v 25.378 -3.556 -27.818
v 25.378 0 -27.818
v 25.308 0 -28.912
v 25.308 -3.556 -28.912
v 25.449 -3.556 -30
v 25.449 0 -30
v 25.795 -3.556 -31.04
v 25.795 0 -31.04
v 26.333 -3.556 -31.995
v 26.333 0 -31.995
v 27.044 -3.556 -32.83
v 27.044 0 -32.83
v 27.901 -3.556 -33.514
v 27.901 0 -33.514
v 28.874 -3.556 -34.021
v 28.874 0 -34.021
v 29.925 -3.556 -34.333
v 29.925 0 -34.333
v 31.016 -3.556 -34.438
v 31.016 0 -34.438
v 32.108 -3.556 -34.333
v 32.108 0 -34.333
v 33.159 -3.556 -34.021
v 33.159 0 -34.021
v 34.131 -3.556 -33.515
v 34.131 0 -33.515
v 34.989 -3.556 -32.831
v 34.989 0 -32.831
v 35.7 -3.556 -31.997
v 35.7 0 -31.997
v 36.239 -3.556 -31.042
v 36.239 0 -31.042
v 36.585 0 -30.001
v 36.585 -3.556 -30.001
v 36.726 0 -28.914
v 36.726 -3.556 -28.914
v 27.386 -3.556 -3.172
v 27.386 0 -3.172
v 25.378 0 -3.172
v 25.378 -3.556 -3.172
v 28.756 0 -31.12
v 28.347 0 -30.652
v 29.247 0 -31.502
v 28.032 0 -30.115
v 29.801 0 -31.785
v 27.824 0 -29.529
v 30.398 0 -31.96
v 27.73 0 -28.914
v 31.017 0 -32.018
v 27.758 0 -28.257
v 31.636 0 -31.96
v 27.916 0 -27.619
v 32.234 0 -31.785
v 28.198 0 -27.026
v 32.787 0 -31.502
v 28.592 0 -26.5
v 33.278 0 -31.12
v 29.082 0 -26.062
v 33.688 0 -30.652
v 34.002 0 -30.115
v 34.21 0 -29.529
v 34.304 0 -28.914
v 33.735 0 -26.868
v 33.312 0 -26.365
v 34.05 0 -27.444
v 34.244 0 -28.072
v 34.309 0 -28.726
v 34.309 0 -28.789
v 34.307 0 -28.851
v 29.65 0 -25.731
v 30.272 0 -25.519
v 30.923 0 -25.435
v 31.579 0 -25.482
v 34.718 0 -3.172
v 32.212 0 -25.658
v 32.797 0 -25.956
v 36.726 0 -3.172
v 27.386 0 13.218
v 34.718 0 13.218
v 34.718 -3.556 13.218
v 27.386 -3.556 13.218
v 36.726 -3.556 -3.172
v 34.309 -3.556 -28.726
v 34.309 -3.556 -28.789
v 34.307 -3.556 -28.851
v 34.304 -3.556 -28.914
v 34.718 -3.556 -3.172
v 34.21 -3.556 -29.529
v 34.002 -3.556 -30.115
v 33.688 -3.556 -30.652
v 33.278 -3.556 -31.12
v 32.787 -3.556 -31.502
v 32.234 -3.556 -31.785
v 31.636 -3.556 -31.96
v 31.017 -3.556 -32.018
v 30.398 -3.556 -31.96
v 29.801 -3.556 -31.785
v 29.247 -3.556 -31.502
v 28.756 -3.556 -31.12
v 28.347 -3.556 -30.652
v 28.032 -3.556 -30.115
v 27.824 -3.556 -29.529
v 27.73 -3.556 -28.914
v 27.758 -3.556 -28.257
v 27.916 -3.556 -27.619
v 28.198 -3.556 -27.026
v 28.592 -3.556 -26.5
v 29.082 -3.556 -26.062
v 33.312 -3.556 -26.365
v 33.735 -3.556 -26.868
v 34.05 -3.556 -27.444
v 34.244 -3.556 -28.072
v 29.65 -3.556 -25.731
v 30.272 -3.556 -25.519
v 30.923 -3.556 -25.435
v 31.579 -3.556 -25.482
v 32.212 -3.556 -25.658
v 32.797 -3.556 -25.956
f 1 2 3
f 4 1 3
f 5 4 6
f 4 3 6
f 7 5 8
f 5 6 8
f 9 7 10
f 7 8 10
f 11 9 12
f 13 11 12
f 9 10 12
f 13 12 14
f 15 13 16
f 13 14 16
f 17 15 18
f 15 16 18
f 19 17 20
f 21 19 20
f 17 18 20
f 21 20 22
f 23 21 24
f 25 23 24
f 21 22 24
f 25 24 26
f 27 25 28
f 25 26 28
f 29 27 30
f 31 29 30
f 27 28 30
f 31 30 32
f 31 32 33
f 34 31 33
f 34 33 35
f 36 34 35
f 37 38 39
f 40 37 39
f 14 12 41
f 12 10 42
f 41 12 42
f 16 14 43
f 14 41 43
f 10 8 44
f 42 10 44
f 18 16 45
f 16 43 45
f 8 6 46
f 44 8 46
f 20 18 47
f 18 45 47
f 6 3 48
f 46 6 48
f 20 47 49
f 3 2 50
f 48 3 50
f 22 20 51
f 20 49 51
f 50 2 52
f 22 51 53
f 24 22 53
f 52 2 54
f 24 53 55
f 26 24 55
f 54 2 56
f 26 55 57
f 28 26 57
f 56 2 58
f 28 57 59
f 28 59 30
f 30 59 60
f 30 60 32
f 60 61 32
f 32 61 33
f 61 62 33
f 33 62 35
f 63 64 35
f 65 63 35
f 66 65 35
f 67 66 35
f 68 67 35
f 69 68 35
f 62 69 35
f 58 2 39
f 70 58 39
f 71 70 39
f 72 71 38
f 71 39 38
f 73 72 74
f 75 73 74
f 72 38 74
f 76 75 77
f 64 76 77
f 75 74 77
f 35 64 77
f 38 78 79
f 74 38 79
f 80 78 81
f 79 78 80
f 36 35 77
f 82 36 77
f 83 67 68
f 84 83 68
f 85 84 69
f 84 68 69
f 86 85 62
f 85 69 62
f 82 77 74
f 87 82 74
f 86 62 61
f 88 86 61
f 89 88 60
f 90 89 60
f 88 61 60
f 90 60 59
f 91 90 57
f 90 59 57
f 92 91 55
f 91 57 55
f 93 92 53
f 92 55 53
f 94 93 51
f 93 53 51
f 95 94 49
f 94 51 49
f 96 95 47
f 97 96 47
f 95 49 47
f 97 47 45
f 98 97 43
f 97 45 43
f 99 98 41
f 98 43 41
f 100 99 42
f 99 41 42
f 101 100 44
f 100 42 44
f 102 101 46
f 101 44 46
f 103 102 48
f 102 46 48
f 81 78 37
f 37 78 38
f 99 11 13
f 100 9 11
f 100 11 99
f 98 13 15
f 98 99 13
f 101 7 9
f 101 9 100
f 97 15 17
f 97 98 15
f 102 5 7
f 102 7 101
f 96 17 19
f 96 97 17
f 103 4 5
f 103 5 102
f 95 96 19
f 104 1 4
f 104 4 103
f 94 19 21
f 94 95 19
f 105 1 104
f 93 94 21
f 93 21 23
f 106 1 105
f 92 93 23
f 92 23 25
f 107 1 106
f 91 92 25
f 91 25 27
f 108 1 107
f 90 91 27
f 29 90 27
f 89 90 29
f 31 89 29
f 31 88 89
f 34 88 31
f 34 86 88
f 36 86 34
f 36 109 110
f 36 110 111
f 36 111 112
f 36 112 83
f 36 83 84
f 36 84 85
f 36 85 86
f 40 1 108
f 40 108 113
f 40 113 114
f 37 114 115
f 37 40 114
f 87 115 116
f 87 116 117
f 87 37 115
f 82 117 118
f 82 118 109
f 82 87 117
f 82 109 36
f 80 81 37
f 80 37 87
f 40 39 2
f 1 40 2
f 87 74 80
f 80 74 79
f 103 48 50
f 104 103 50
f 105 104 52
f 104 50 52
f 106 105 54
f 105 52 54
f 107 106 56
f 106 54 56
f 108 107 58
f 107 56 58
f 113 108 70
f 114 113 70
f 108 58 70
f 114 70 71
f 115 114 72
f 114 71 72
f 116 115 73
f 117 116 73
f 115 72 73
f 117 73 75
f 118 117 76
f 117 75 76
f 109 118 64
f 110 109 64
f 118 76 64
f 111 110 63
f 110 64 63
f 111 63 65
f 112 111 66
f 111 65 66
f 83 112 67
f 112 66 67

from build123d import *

# Parameters (mm, degrees)
F0_W     = 7.332219354
F0_H     = 16.389713157
F1_DEPTH = 3.556


with BuildPart() as f1:
    # F0 (on Front) → F1 (new body)
    with BuildSketch(Plane.XZ):
        with Locations((31.0518859964, 5.022654077)):
            Rectangle(F0_W, F0_H)
        with Locations((31.0518859964, -11.3670590799)):
            Rectangle(F0_W, F0_H)
        with BuildLine():
            Line((25.3776218742, -3.1722025014), (25.3776218742, -27.8178208713))
            ThreePointArc((25.3776218742, -27.8178208713), (31.379030254, -23.0253955717), (36.7261501186, -28.5383396079))
            Line((36.7261501186, -28.5383396079), (36.7261501186, -3.1722025014))
            Line((36.7261501186, -3.1722025014), (34.7179956734, -3.1722025014))
            Line((34.7179956734, -3.1722025014), (34.7179956734, -19.5619156584))
            Line((34.7179956734, -19.5619156584), (27.3857763194, -19.5619156584))
            Line((27.3857763194, -19.5619156584), (27.3857763194, -3.1722025014))
            Line((27.3857763194, -3.1722025014), (25.3776218742, -3.1722025014))
        make_face()
        with BuildLine():
            ThreePointArc((34.3040495539, -28.9137765537), (31.0170948505, -32.0183687355), (27.7301401472, -28.9137765537))
            Line((27.7301401472, -28.9137765537), (25.3776218742, -28.9137765537))
            Line((25.3776218742, -28.9137765537), (25.3776218742, -27.8178208713))
            ThreePointArc((25.3776218742, -27.8178208713), (30.4680136742, -34.4117471456), (36.7261501186, -28.9137765537))
            Line((36.7261501186, -28.9137765537), (34.3040495539, -28.9137765537))
        make_face()
        with BuildLine():
            ThreePointArc((27.7301401472, -28.9137765537), (30.9231974181, -25.4350866863), (34.3094055053, -28.7260580808))
            ThreePointArc((34.3094055053, -28.7260580808), (34.308066245, -28.8199555132), (34.3040495539, -28.9137765537))
            Line((34.3040495539, -28.9137765537), (36.7261501186, -28.9137765537))
            Line((36.7261501186, -28.9137765537), (36.7261501186, -28.5383396079))
            ThreePointArc((36.7261501186, -28.5383396079), (31.379030254, -23.0253955717), (25.3776218742, -27.8178208713))
            Line((25.3776218742, -27.8178208713), (25.3776218742, -28.9137765537))
            Line((25.3776218742, -28.9137765537), (27.7301401472, -28.9137765537))
        make_face()
    extrude(amount=F1_DEPTH)


solid = f1.part
